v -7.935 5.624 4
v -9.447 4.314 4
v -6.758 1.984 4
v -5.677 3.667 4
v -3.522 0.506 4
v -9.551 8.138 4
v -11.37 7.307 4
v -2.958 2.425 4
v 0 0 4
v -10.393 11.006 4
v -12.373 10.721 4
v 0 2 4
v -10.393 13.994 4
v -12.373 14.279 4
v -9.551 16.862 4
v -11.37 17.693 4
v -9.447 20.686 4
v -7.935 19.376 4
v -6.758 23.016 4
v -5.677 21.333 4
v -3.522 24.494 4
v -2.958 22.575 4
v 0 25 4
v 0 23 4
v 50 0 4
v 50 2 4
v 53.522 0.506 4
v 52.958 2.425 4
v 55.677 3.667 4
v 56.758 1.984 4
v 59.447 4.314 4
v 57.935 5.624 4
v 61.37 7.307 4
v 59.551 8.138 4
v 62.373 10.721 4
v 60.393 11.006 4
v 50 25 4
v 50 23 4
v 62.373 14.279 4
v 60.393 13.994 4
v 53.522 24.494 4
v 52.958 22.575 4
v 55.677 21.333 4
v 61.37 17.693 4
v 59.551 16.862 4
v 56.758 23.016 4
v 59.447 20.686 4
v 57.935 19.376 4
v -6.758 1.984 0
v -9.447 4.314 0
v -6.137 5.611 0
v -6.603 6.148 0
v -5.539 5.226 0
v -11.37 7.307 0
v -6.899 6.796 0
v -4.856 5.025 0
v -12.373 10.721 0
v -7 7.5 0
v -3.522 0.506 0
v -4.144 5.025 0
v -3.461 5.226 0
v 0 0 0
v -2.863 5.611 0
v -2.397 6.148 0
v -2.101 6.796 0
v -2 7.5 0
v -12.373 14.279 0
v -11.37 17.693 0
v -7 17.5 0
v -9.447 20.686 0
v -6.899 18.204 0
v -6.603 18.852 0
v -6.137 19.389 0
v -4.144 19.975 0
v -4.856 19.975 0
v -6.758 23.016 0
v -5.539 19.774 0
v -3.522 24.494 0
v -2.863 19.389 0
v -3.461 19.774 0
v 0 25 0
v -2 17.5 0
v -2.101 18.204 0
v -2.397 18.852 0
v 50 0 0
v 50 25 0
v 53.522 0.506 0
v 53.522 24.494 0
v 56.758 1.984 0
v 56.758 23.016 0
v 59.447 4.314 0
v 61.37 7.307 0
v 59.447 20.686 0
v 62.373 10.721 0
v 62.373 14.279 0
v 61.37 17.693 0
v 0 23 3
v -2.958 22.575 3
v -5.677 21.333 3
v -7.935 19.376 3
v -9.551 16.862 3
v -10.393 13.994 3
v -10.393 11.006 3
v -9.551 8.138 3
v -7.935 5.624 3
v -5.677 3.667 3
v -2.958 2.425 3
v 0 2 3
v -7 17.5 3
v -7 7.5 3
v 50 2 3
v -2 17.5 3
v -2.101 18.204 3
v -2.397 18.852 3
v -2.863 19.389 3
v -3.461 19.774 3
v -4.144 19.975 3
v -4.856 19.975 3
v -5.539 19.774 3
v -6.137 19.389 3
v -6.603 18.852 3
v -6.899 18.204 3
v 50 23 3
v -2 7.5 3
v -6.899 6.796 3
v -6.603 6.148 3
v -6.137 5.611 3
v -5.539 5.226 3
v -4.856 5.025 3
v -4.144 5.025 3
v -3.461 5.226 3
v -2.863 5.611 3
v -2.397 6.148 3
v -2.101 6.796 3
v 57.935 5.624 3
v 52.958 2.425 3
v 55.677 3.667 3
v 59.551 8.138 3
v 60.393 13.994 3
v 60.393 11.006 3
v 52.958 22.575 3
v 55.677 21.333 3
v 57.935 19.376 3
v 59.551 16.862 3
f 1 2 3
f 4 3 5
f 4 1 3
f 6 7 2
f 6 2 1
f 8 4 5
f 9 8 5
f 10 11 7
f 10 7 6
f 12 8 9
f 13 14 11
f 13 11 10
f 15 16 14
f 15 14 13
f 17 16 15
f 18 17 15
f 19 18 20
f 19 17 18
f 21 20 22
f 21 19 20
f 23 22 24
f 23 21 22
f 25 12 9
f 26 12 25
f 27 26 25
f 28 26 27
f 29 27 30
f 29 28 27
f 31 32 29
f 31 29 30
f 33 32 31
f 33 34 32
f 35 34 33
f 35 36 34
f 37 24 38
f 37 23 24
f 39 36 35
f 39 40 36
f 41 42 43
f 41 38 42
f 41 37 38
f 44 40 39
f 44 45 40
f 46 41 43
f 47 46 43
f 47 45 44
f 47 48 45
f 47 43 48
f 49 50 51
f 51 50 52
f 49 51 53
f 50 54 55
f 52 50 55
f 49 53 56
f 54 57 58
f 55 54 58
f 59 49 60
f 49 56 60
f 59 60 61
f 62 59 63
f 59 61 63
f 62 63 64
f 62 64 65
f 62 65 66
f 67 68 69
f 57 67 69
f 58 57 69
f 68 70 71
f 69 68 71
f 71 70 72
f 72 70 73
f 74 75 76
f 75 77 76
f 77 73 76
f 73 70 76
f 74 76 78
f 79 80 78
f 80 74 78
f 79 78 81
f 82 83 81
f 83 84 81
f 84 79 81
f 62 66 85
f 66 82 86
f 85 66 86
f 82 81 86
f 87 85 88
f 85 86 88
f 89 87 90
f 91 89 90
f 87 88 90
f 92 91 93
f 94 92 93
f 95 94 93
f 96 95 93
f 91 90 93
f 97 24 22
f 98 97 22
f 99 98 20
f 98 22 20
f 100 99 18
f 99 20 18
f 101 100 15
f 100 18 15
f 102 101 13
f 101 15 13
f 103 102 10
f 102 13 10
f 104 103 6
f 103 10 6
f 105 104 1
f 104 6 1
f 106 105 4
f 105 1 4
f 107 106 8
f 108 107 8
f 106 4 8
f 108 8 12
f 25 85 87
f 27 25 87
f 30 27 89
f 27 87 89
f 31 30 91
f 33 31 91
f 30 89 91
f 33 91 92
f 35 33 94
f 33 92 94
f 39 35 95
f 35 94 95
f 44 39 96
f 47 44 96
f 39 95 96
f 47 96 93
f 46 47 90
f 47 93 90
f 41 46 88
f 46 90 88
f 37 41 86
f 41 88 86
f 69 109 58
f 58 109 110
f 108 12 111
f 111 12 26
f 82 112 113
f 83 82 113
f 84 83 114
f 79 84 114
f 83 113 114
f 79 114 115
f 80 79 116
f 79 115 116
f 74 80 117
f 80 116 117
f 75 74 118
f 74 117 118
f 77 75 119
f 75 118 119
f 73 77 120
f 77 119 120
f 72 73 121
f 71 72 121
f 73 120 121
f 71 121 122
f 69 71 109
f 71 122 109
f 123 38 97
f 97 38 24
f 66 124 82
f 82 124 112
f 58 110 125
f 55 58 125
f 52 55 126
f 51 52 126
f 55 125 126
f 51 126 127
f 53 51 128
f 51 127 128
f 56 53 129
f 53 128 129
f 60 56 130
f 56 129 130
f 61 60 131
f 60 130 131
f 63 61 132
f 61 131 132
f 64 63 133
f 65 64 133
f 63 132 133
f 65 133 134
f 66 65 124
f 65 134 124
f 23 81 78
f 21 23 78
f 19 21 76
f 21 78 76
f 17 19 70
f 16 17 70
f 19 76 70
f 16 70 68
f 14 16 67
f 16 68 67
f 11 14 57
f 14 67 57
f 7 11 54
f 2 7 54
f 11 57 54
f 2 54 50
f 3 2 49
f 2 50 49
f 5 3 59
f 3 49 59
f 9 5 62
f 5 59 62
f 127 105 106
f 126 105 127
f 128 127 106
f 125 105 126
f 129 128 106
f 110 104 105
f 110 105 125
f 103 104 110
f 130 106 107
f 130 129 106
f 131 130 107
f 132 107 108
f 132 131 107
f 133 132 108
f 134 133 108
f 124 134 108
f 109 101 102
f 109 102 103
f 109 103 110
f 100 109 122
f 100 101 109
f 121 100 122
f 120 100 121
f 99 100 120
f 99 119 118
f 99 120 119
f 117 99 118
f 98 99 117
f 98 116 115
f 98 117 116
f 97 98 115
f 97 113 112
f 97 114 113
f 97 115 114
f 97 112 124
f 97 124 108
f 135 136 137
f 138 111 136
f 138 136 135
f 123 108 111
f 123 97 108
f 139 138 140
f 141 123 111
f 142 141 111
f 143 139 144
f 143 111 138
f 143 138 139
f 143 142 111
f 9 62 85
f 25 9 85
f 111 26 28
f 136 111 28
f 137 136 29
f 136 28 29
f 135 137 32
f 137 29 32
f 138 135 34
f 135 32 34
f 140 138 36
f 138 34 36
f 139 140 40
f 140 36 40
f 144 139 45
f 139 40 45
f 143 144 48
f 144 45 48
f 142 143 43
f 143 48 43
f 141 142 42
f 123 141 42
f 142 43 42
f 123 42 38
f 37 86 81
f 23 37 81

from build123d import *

# Parameters (mm, degrees)
PAD_DEPTH       = 4
POCKET_DEPTH    = 1
POCKET001_DEPTH = 3.001


with BuildPart() as part:
    # Sketch → Pad (new body)
    with BuildSketch(Plane.XY):
        with BuildLine():
            Line((0, 0), (50, 0))
            ThreePointArc((50, 0), (62.5, 12.5), (50, 25))
            Line((50, 25), (0, 25))
            ThreePointArc((0, 25), (-12.5, 12.5), (0, 0))
        make_face()
    extrude(amount=PAD_DEPTH)

    # Sketch001 (on Face6 of Pad) → Pocket (cut)
    with BuildSketch(Plane.XY.offset(4)):
        with BuildLine():
            Line((0, 2), (50, 2))
            ThreePointArc((50, 2), (60.5, 12.5), (50, 23))
            Line((50, 23), (0, 23))
            ThreePointArc((0, 23), (-10.5, 12.5), (0, 2))
        make_face()
    extrude(amount=-POCKET_DEPTH, mode=Mode.SUBTRACT)

    # Sketch002 (on Face11 of Pocket) → Pocket001 (cut, through all)
    with BuildSketch(Plane.XY.offset(3)):
        with BuildLine():
            ThreePointArc((-2, 17.5), (-4.5, 20), (-7, 17.5))
            Line((-7, 17.5), (-7, 7.5))
            ThreePointArc((-7, 7.5), (-4.5, 5), (-2, 7.5))
            Line((-2, 7.5), (-2, 17.5))
        make_face()
    extrude(amount=-POCKET001_DEPTH, mode=Mode.SUBTRACT)


solid = part.part
